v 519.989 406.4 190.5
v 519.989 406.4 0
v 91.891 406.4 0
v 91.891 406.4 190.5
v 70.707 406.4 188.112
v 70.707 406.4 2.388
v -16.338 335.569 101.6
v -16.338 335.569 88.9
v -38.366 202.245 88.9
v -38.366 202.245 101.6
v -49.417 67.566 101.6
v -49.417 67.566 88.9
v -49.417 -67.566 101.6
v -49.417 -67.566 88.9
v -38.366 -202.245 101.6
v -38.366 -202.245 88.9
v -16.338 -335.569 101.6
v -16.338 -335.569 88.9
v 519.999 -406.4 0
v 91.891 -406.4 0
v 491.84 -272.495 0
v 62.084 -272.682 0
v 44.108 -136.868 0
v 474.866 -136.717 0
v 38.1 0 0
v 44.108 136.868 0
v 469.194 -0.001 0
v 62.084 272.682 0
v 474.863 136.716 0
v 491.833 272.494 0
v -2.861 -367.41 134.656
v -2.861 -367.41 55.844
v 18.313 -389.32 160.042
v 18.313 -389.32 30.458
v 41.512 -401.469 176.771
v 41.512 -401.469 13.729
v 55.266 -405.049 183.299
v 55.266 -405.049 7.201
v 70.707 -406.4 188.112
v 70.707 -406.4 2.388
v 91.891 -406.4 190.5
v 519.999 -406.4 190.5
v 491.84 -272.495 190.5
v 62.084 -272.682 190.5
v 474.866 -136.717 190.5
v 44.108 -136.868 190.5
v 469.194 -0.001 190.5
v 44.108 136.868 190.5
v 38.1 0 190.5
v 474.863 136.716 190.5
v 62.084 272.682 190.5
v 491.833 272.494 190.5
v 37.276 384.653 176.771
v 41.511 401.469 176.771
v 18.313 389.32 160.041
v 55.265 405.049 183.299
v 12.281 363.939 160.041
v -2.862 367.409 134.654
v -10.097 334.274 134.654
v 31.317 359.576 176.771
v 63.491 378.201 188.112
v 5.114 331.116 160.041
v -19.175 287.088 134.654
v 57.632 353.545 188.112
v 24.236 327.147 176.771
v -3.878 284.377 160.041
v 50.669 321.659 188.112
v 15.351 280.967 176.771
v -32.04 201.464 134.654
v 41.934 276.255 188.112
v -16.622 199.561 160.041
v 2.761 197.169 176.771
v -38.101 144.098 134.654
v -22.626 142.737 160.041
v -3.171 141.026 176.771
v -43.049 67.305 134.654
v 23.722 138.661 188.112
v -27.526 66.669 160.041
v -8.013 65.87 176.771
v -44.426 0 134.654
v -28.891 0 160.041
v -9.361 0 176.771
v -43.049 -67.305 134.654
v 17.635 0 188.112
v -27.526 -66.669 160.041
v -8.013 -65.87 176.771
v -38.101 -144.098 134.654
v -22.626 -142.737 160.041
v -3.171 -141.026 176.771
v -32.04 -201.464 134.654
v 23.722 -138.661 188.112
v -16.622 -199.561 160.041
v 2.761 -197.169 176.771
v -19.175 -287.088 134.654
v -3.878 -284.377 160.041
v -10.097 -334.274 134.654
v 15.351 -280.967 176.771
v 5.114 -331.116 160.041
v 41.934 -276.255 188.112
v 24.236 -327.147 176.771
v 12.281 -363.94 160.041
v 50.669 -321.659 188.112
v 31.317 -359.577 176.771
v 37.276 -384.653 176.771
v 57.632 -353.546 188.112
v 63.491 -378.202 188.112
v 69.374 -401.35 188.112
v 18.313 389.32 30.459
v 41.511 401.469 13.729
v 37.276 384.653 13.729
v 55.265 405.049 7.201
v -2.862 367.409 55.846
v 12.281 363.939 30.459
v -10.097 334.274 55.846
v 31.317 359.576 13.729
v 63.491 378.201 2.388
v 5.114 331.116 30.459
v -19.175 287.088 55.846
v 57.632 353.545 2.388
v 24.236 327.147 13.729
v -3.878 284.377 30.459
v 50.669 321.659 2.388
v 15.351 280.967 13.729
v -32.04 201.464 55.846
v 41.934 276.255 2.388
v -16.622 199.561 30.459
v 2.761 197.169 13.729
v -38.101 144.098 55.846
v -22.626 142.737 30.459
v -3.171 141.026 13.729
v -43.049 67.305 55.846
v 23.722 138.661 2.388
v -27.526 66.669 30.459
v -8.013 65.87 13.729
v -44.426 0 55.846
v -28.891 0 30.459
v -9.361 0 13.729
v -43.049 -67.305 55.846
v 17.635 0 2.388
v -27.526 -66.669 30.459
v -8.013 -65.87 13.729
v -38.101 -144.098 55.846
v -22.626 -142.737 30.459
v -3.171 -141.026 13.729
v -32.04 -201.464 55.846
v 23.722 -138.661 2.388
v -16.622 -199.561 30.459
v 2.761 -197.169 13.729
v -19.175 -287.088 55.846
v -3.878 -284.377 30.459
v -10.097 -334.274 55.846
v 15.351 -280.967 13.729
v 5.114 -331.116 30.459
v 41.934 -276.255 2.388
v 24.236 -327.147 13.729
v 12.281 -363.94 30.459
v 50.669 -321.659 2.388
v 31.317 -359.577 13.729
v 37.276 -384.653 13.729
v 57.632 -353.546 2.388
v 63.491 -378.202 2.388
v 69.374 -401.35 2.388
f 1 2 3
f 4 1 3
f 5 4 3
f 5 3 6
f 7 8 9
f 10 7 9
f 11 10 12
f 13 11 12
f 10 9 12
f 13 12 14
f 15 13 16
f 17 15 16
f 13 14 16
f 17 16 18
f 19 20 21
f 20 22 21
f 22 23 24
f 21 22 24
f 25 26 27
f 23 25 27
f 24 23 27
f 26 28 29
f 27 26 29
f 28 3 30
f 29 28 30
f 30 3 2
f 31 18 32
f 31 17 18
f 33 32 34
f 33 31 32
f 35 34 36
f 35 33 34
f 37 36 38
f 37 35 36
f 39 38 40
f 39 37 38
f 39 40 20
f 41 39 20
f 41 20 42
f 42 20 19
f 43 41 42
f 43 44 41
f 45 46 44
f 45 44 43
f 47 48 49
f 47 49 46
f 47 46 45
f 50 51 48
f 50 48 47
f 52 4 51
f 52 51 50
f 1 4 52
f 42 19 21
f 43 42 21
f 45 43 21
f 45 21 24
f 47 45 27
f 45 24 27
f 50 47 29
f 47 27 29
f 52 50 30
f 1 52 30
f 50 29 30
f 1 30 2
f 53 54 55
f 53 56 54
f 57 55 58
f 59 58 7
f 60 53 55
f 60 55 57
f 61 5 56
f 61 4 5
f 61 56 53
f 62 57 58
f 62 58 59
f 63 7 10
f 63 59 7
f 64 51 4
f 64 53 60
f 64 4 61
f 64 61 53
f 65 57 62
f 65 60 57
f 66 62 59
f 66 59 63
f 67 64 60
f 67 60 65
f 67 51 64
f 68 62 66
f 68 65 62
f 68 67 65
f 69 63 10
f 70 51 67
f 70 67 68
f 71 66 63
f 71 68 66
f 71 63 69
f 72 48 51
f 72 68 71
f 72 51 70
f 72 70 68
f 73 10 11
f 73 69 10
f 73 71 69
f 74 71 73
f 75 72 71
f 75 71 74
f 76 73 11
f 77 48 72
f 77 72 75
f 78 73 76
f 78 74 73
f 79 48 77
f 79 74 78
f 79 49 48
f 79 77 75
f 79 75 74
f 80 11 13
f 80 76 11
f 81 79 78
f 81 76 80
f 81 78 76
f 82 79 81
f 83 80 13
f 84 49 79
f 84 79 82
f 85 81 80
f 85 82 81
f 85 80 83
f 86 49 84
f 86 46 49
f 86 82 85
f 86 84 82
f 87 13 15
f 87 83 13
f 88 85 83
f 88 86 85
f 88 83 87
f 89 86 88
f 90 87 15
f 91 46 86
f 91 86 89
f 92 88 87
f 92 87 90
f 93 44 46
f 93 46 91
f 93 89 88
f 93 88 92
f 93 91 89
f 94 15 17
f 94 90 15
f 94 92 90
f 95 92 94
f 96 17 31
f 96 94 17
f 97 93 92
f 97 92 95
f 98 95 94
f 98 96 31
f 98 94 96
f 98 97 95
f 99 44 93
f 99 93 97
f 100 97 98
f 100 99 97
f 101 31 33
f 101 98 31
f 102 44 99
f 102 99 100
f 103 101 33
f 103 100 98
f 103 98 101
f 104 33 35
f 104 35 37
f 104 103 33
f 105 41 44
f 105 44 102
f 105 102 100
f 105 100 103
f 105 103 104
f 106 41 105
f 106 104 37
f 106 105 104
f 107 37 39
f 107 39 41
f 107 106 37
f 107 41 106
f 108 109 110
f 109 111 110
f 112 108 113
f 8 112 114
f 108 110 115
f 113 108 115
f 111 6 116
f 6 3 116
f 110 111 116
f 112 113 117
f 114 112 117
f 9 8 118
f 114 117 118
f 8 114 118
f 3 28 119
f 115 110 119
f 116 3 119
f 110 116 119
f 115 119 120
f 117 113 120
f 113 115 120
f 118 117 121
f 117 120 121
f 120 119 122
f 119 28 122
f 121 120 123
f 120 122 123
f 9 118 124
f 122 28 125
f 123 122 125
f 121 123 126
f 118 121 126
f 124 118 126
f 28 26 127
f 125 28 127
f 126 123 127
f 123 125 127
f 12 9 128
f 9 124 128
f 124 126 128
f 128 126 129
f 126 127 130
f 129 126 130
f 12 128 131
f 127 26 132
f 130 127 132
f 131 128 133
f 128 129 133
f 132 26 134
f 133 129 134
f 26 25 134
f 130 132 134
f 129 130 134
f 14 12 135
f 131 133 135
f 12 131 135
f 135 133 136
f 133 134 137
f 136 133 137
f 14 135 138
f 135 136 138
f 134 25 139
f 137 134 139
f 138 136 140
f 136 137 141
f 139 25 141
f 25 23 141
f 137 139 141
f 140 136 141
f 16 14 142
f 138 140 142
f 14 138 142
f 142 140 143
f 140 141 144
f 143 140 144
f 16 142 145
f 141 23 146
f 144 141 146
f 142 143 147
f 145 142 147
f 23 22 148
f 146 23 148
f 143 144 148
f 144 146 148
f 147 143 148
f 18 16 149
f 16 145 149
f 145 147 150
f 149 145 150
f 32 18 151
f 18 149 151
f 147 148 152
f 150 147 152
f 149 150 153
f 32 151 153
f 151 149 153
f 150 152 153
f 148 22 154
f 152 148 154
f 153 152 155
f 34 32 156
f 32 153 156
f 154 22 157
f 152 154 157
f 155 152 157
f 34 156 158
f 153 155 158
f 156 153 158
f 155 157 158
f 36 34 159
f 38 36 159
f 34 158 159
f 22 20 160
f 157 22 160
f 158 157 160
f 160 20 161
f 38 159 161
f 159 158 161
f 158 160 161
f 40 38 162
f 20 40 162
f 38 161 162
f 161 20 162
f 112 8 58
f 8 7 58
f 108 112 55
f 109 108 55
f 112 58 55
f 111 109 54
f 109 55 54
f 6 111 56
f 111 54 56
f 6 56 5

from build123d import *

# Parameters (mm, degrees)
F1_DEPTH = 190.5
F2_R     = 88.9


with BuildPart() as f1:
    # F0 (on Top) → F1 (new body)
    with BuildSketch(Plane.XY):
        with BuildLine():
            Line((0, -406.4), (0, 0))
            Line((0, 0), (0, 406.4))
            ThreePointArc((0, 406.4), (-50.8, 0), (0, -406.4))
        make_face()
        with BuildLine():
            Line((0, 406.4), (0, 0))
            Line((0, 0), (0, -406.4))
            Line((0, -406.4), (519.99896, -406.4))
            ThreePointArc((519.99896, -406.4), (469.19388, -0.000635), (519.9888, 406.4))
            Line((519.9888, 406.4), (0, 406.4))
        make_face()
    extrude(amount=F1_DEPTH)

    # F2
    f2_edges = [f1.edges().sort_by_distance(p)[0] for p in [
        (0, 406.4, 95.25),
        (0, -406.4, 95.25),
        (-50.8, 0, 0),
        (-50.8, 0, 190.5),
    ]]
    fillet(f2_edges, radius=F2_R)


solid = f1.part
